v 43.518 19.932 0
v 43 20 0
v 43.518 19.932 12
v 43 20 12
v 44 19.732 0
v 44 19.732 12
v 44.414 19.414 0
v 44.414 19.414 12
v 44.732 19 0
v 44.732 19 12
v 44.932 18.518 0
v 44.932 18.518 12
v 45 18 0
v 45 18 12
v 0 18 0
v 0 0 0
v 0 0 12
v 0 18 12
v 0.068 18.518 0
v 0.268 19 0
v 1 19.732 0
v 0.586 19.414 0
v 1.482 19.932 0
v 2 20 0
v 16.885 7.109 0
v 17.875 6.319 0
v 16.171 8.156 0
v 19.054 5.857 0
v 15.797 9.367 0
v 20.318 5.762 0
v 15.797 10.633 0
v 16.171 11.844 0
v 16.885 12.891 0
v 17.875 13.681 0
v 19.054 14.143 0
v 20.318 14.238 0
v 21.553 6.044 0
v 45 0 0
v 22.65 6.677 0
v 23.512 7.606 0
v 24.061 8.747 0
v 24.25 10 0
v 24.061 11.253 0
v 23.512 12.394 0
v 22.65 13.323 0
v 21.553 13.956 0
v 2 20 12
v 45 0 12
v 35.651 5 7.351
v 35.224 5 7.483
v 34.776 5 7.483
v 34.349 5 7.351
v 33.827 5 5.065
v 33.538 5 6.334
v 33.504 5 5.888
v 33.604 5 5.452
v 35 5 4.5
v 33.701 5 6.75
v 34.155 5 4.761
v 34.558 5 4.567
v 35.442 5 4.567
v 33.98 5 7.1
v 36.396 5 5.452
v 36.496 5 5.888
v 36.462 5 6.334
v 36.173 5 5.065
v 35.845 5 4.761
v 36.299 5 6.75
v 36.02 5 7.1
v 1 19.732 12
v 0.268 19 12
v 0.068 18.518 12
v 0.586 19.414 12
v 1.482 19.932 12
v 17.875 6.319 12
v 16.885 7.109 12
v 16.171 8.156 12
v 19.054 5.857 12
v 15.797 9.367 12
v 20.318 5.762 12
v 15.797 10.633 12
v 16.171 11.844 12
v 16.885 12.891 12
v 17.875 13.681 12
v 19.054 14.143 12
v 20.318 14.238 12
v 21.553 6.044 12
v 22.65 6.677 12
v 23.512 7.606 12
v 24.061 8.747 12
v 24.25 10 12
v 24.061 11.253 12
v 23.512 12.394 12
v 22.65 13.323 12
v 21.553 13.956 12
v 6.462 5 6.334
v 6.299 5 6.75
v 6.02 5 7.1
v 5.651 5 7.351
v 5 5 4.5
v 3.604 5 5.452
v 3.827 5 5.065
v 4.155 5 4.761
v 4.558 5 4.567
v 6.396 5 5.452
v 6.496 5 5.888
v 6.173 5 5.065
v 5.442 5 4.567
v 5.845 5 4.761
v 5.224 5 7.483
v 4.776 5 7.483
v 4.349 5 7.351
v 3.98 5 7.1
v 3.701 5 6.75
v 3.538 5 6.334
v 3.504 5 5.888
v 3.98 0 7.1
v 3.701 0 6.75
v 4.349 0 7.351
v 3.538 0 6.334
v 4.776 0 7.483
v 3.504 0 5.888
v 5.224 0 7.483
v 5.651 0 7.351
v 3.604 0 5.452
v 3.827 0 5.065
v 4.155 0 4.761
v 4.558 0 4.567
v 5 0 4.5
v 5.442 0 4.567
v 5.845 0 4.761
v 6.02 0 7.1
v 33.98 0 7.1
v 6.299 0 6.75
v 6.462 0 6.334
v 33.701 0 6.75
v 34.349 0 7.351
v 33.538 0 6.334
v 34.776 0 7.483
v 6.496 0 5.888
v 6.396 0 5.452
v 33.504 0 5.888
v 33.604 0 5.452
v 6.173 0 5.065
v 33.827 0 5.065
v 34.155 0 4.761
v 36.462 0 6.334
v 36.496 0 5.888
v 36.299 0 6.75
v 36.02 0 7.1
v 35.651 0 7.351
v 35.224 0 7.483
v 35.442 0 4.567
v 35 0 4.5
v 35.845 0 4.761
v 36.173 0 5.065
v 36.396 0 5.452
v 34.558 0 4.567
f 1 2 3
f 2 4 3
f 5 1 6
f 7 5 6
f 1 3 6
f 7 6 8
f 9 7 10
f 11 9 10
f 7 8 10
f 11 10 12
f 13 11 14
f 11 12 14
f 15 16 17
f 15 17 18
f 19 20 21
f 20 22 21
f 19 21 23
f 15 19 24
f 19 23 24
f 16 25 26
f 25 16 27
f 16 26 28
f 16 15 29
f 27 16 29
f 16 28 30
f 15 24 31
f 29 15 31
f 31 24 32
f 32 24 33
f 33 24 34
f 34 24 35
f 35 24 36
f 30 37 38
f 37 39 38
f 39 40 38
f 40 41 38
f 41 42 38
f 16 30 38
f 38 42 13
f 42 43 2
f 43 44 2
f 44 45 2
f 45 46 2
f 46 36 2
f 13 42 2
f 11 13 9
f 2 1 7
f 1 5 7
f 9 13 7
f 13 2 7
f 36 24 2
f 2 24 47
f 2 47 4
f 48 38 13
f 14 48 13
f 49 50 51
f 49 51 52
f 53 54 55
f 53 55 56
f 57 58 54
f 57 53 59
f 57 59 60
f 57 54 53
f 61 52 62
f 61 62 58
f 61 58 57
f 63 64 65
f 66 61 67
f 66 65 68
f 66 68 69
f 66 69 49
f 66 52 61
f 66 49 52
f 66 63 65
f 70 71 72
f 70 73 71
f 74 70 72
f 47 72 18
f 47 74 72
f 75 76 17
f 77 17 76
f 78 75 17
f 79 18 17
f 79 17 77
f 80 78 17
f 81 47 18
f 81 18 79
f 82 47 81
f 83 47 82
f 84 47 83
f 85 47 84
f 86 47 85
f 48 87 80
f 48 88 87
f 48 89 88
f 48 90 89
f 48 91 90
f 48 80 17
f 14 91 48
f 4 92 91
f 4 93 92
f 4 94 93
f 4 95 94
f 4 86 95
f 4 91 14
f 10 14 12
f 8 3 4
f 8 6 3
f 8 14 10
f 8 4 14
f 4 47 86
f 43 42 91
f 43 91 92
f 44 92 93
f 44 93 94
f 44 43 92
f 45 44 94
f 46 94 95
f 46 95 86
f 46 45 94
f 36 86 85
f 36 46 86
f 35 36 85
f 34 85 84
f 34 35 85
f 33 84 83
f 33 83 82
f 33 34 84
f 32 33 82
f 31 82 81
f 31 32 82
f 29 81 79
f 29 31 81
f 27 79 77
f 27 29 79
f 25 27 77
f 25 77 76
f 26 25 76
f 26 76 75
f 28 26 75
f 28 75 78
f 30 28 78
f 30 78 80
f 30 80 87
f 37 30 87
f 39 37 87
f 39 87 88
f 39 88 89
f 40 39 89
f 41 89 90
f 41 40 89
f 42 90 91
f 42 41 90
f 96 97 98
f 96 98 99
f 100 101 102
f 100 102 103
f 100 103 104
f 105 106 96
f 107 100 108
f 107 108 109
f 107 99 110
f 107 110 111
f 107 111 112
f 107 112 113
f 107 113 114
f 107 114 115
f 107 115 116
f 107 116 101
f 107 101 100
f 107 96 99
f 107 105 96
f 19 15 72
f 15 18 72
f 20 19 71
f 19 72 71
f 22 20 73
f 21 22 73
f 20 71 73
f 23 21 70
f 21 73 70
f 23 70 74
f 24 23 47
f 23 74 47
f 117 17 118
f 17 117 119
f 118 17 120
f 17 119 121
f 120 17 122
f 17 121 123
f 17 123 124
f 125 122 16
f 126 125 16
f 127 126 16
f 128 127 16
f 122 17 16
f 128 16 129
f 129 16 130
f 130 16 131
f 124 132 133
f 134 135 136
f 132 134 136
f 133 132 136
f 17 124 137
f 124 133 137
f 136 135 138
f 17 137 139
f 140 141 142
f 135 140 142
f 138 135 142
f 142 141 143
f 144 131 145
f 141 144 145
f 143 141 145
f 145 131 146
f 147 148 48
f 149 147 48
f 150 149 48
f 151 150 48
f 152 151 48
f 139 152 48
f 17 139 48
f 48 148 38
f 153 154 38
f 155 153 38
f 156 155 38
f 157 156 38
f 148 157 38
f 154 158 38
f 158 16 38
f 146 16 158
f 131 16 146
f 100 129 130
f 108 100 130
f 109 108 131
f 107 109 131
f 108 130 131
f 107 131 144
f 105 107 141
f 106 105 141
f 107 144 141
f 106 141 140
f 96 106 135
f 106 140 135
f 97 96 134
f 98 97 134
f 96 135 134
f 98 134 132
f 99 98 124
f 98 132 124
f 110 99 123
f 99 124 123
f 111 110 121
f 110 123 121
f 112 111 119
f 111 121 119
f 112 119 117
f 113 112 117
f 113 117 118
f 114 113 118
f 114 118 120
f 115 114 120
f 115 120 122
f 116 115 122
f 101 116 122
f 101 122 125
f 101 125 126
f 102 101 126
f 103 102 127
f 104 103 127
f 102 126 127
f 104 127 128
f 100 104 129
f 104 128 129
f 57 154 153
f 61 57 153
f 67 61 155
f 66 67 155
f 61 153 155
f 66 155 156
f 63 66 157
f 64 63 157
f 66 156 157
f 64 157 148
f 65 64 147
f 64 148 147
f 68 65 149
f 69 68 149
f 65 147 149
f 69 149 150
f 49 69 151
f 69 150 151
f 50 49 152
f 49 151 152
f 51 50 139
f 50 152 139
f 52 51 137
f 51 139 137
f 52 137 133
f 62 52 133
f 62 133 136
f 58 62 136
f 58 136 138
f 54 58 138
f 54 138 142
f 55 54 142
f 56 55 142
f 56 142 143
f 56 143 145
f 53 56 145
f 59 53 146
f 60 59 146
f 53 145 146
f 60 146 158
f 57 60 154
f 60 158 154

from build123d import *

# Parameters (mm, degrees)
SKETCH1_W           = 45
SKETCH1_H           = 20
SKETCH1_R           = 4.25
BOSS_EXTRUDE1_DEPTH = 12
FILLET1_R           = 2
SKETCH2_R           = 1.5
CUT_EXTRUDE1_DEPTH  = 5


with BuildPart() as part:
    # Sketch1 → Boss-Extrude1 (new body)
    with BuildSketch(Plane.XY):
        with Locations((22.5, 10)):
            Rectangle(SKETCH1_W, SKETCH1_H)
        with Locations((20, 10)):
            Circle(SKETCH1_R, mode=Mode.SUBTRACT)
    extrude(amount=BOSS_EXTRUDE1_DEPTH)

    # Fillet1
    fillet1_edges = [part.edges().sort_by_distance(p)[0] for p in [
        (0, 20, 6),
        (45, 20, 6),
    ]]
    fillet(fillet1_edges, radius=FILLET1_R)

    # Sketch2 → Cut-Extrude1 (cut)
    with BuildSketch(Plane.XZ):
        with Locations(Location((5, 6, 0), (0, 0, 270))):
            Circle(SKETCH2_R)
        with Locations(Location((35, 6, 0), (0, 0, 270))):
            Circle(SKETCH2_R)
    extrude(amount=-CUT_EXTRUDE1_DEPTH, mode=Mode.SUBTRACT)


solid = part.part
